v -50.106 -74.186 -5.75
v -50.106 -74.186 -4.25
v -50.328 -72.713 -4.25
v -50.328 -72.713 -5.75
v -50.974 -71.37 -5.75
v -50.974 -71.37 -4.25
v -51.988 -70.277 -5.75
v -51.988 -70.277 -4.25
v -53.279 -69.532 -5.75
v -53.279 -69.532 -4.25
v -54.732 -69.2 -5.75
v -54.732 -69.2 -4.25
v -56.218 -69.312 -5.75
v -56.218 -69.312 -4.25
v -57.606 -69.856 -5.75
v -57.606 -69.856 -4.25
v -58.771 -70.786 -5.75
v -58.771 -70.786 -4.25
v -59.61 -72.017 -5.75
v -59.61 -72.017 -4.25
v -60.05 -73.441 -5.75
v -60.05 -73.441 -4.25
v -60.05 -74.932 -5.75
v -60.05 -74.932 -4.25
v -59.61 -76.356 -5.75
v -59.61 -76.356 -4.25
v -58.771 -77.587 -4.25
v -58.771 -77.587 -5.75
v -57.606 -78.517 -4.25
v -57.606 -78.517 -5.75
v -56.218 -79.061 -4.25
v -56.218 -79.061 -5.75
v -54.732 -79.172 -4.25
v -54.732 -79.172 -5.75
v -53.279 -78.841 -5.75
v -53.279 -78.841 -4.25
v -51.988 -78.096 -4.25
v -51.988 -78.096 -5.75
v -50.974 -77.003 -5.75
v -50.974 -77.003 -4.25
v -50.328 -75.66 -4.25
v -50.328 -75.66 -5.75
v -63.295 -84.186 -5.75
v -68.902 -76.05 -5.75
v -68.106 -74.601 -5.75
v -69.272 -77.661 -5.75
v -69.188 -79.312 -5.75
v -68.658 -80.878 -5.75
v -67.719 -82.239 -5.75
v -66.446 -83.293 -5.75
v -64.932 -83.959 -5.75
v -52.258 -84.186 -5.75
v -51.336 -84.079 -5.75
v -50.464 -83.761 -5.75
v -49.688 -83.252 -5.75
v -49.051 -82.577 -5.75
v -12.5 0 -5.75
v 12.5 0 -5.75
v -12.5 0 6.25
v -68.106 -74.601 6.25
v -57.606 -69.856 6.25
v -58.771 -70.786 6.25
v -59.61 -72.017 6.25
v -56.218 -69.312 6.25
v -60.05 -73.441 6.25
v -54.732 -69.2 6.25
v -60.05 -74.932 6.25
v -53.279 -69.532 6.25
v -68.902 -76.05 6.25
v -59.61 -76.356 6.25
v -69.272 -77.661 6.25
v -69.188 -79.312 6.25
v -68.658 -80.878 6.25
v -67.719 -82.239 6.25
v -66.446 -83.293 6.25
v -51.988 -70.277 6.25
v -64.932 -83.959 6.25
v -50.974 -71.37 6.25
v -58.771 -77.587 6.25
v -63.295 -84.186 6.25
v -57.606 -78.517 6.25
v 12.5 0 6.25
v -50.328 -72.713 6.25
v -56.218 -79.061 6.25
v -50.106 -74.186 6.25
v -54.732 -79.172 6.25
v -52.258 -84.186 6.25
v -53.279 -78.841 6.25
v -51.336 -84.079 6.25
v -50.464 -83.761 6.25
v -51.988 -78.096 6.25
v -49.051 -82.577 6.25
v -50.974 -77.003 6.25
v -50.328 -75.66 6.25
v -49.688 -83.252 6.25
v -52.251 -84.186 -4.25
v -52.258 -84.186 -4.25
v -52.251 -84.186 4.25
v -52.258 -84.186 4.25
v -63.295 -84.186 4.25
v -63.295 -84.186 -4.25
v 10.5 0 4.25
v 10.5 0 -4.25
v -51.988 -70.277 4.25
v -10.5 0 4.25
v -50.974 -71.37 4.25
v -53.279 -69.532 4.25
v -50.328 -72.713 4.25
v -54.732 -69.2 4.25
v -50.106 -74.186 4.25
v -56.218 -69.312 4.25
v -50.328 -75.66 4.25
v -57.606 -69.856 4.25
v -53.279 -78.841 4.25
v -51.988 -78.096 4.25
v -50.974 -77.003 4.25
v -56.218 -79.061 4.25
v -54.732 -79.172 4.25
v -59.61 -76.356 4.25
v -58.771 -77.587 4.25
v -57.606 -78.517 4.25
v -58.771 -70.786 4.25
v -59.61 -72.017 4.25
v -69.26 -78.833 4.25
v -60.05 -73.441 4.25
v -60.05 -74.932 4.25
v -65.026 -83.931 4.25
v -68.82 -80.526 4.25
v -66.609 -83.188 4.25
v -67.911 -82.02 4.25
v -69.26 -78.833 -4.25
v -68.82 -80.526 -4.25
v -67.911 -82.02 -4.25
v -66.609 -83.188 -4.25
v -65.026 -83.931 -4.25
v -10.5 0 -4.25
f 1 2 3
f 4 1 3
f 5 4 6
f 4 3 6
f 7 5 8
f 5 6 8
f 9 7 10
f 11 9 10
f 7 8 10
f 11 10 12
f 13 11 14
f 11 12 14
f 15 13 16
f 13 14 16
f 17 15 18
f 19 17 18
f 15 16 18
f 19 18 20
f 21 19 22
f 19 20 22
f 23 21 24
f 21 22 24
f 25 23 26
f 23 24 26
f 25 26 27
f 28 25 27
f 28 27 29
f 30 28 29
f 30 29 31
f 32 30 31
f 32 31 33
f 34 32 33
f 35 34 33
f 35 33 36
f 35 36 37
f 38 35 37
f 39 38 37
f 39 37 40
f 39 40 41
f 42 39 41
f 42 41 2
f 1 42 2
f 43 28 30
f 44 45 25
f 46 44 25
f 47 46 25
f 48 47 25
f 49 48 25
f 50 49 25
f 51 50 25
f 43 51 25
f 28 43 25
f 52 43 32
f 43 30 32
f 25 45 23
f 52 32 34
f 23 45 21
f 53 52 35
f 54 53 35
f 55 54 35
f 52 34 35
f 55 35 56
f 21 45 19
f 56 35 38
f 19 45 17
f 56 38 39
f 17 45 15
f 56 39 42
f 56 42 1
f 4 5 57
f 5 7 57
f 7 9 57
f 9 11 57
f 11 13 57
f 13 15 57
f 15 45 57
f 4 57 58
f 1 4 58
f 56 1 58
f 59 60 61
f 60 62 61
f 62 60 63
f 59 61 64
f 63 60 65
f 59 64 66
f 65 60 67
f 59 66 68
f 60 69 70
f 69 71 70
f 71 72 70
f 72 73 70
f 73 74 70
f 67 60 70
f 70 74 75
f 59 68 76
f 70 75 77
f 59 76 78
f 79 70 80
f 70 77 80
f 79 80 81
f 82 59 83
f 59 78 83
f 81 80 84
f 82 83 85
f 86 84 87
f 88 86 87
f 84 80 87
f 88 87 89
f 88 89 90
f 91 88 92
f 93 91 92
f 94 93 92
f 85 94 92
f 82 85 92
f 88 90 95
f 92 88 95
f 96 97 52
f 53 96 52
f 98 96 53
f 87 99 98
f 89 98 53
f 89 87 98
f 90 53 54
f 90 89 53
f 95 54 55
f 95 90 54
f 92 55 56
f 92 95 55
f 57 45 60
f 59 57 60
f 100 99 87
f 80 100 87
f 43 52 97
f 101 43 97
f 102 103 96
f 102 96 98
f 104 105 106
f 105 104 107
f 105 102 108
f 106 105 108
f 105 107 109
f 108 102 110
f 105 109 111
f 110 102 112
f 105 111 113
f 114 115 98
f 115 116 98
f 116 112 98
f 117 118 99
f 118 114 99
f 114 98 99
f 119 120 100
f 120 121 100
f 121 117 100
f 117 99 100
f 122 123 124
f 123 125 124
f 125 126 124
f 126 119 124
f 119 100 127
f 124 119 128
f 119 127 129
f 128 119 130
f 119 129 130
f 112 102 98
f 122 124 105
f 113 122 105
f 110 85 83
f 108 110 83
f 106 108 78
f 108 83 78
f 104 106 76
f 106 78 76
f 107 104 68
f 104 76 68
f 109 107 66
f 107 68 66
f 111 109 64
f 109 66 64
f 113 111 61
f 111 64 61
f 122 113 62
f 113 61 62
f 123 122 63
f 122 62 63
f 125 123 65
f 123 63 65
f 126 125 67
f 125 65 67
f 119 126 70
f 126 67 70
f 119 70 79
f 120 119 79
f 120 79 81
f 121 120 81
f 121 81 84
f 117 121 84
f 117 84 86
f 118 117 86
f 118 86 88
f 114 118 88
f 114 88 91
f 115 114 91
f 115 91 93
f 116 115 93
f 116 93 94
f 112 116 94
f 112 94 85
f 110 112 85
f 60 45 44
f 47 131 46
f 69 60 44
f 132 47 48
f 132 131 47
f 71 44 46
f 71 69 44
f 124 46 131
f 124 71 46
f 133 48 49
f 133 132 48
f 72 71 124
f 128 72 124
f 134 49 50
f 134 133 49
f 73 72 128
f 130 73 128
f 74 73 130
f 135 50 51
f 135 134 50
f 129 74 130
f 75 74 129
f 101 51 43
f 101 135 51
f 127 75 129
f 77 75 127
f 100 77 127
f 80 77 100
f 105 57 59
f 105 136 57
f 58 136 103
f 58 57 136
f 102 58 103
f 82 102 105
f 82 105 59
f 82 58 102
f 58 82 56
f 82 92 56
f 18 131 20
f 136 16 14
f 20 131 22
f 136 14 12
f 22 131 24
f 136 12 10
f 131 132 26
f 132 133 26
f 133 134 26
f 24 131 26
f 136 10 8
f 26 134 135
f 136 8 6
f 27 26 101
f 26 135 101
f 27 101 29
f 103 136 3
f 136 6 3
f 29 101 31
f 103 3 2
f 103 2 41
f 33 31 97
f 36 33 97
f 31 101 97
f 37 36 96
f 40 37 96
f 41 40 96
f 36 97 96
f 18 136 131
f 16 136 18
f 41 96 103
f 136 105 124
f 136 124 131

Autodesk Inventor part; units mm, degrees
ref_plane "YZ Plane" through (0, 0, 0) normal (1, 0, 0) x (0, 1, 0)
ref_plane "XZ Plane" through (0, 0, 0) normal (0, 1, 0) x (-1, 0, 0)
ref_plane "XY Plane" through (0, 0, 0) normal (0, 0, 1) x (1, 0, 0)
sketch "Boceto1" plane through (0, 0, 0) normal (0, 1, 0) x (-1, 0, 0)
  line L0 (12.5, 6.25) -> (-12.5, 6.25)
  line L1 (-12.5, 6.25) -> (-12.5, -6.25)
  line L2 (-12.5, -6.25) -> (12.5, -6.25)
  line L3 (12.5, -6.25) -> (12.5, 6.25)
  line L4 (10.5, 4.25) -> (-10.5, 4.25)
  line L5 (-10.5, 4.25) -> (-10.5, -4.25)
  line L6 (-10.5, -4.25) -> (10.5, -4.25)
  line L7 (10.5, -4.25) -> (10.5, 4.25)
  point P0 (0, 0)
  point P1 (12.5, 0)
  point P2 (0, -6.25)
  point P3 (10.5, 0)
  point P4 (0, 4.25)
  dimension "d3" = 25
  dimension "d4" = 12.5
  dimension "d6" = 2
  dimension "d7" = 2
sketch "Boceto2" plane through (0, 0, 0) normal (0, 0, 1) x (1, 0, 0)
  line L0 (0, 0) -> (-62.7506, -84.1864)
  line L1 (0, 0) -> (0, -34.6116) construction
  dimension "d2" = 36.7
  dimension "d5" = 105
sweep "Barrido1" add profiles "Boceto1" path "Boceto2"
sketch "Boceto3" plane through (-12.5, 0, 6.25) normal (0, 0, 1) x (1, 0, 0)
  line L0 (0, 0) -> (25, 0) projected
  line L1 (0, 0) -> (-62.7506, -84.1864) projected
  line L2 (-37.7506, -84.1864) -> (-62.7506, -84.1864) projected
  line L3 (25, 0) -> (-37.7506, -84.1864) projected
  line L4 (25, 0) -> (-37.7506, -84.1864) projected
  line L5 (25, 0) -> (-36.551, -82.5769)
  line L6 (-37.7506, -84.1864) -> (-62.7506, -84.1864) projected
  line L7 (0, 0) -> (-62.7506, -84.1864) projected
  line L8 (-55.6056, -74.6007) -> (0, 0)
  line L9 (0, 0) -> (25, 0) projected
  line L10 (0, 0) -> (25, 0)
  line L11 (-39.7581, -84.1864) -> (-50.795, -84.1864)
  arc A0 (-39.7581, -84.1864) -> (-36.551, -82.5769) centre (-39.7581, -80.1864) ccw
  arc A1 (-55.6056, -74.6007) -> (-50.795, -84.1864) centre (-50.795, -78.1864) ccw
  line L12 (12.5, 0) -> (-50.2506, -84.1864) projected
  dimension "d10" = 4
  dimension "d11" = 6
extrude "Extrusión1" cut sketch "Boceto3" against normal blind 12 contours L0 L12 L2 A1 L1 | L0 L3 A0 L2 L12 keep common part
sketch "Boceto4" plane through (-12.5, 0, 6.25) normal (0, 0, 1) x (1, 0, 0)
  circle A0 centre (-42.6056, -74.1864) radius 5
  line L0 (-39.7581, -84.1864) -> (-50.795, -84.1864) projected
  line L1 (0, 0) -> (-55.6056, -74.6007) projected
  point P0 (12.5, 0)
  dimension "d16" = 10
  dimension "d17" = 13
  dimension "d18" = 10
extrude "Extrusión2" cut sketch "Boceto4" against normal blind 12
equation "\"d4\" = 0.5 * d3"
properties part number "Asiento - Soporte Manija" material "Aluminio 6061"
